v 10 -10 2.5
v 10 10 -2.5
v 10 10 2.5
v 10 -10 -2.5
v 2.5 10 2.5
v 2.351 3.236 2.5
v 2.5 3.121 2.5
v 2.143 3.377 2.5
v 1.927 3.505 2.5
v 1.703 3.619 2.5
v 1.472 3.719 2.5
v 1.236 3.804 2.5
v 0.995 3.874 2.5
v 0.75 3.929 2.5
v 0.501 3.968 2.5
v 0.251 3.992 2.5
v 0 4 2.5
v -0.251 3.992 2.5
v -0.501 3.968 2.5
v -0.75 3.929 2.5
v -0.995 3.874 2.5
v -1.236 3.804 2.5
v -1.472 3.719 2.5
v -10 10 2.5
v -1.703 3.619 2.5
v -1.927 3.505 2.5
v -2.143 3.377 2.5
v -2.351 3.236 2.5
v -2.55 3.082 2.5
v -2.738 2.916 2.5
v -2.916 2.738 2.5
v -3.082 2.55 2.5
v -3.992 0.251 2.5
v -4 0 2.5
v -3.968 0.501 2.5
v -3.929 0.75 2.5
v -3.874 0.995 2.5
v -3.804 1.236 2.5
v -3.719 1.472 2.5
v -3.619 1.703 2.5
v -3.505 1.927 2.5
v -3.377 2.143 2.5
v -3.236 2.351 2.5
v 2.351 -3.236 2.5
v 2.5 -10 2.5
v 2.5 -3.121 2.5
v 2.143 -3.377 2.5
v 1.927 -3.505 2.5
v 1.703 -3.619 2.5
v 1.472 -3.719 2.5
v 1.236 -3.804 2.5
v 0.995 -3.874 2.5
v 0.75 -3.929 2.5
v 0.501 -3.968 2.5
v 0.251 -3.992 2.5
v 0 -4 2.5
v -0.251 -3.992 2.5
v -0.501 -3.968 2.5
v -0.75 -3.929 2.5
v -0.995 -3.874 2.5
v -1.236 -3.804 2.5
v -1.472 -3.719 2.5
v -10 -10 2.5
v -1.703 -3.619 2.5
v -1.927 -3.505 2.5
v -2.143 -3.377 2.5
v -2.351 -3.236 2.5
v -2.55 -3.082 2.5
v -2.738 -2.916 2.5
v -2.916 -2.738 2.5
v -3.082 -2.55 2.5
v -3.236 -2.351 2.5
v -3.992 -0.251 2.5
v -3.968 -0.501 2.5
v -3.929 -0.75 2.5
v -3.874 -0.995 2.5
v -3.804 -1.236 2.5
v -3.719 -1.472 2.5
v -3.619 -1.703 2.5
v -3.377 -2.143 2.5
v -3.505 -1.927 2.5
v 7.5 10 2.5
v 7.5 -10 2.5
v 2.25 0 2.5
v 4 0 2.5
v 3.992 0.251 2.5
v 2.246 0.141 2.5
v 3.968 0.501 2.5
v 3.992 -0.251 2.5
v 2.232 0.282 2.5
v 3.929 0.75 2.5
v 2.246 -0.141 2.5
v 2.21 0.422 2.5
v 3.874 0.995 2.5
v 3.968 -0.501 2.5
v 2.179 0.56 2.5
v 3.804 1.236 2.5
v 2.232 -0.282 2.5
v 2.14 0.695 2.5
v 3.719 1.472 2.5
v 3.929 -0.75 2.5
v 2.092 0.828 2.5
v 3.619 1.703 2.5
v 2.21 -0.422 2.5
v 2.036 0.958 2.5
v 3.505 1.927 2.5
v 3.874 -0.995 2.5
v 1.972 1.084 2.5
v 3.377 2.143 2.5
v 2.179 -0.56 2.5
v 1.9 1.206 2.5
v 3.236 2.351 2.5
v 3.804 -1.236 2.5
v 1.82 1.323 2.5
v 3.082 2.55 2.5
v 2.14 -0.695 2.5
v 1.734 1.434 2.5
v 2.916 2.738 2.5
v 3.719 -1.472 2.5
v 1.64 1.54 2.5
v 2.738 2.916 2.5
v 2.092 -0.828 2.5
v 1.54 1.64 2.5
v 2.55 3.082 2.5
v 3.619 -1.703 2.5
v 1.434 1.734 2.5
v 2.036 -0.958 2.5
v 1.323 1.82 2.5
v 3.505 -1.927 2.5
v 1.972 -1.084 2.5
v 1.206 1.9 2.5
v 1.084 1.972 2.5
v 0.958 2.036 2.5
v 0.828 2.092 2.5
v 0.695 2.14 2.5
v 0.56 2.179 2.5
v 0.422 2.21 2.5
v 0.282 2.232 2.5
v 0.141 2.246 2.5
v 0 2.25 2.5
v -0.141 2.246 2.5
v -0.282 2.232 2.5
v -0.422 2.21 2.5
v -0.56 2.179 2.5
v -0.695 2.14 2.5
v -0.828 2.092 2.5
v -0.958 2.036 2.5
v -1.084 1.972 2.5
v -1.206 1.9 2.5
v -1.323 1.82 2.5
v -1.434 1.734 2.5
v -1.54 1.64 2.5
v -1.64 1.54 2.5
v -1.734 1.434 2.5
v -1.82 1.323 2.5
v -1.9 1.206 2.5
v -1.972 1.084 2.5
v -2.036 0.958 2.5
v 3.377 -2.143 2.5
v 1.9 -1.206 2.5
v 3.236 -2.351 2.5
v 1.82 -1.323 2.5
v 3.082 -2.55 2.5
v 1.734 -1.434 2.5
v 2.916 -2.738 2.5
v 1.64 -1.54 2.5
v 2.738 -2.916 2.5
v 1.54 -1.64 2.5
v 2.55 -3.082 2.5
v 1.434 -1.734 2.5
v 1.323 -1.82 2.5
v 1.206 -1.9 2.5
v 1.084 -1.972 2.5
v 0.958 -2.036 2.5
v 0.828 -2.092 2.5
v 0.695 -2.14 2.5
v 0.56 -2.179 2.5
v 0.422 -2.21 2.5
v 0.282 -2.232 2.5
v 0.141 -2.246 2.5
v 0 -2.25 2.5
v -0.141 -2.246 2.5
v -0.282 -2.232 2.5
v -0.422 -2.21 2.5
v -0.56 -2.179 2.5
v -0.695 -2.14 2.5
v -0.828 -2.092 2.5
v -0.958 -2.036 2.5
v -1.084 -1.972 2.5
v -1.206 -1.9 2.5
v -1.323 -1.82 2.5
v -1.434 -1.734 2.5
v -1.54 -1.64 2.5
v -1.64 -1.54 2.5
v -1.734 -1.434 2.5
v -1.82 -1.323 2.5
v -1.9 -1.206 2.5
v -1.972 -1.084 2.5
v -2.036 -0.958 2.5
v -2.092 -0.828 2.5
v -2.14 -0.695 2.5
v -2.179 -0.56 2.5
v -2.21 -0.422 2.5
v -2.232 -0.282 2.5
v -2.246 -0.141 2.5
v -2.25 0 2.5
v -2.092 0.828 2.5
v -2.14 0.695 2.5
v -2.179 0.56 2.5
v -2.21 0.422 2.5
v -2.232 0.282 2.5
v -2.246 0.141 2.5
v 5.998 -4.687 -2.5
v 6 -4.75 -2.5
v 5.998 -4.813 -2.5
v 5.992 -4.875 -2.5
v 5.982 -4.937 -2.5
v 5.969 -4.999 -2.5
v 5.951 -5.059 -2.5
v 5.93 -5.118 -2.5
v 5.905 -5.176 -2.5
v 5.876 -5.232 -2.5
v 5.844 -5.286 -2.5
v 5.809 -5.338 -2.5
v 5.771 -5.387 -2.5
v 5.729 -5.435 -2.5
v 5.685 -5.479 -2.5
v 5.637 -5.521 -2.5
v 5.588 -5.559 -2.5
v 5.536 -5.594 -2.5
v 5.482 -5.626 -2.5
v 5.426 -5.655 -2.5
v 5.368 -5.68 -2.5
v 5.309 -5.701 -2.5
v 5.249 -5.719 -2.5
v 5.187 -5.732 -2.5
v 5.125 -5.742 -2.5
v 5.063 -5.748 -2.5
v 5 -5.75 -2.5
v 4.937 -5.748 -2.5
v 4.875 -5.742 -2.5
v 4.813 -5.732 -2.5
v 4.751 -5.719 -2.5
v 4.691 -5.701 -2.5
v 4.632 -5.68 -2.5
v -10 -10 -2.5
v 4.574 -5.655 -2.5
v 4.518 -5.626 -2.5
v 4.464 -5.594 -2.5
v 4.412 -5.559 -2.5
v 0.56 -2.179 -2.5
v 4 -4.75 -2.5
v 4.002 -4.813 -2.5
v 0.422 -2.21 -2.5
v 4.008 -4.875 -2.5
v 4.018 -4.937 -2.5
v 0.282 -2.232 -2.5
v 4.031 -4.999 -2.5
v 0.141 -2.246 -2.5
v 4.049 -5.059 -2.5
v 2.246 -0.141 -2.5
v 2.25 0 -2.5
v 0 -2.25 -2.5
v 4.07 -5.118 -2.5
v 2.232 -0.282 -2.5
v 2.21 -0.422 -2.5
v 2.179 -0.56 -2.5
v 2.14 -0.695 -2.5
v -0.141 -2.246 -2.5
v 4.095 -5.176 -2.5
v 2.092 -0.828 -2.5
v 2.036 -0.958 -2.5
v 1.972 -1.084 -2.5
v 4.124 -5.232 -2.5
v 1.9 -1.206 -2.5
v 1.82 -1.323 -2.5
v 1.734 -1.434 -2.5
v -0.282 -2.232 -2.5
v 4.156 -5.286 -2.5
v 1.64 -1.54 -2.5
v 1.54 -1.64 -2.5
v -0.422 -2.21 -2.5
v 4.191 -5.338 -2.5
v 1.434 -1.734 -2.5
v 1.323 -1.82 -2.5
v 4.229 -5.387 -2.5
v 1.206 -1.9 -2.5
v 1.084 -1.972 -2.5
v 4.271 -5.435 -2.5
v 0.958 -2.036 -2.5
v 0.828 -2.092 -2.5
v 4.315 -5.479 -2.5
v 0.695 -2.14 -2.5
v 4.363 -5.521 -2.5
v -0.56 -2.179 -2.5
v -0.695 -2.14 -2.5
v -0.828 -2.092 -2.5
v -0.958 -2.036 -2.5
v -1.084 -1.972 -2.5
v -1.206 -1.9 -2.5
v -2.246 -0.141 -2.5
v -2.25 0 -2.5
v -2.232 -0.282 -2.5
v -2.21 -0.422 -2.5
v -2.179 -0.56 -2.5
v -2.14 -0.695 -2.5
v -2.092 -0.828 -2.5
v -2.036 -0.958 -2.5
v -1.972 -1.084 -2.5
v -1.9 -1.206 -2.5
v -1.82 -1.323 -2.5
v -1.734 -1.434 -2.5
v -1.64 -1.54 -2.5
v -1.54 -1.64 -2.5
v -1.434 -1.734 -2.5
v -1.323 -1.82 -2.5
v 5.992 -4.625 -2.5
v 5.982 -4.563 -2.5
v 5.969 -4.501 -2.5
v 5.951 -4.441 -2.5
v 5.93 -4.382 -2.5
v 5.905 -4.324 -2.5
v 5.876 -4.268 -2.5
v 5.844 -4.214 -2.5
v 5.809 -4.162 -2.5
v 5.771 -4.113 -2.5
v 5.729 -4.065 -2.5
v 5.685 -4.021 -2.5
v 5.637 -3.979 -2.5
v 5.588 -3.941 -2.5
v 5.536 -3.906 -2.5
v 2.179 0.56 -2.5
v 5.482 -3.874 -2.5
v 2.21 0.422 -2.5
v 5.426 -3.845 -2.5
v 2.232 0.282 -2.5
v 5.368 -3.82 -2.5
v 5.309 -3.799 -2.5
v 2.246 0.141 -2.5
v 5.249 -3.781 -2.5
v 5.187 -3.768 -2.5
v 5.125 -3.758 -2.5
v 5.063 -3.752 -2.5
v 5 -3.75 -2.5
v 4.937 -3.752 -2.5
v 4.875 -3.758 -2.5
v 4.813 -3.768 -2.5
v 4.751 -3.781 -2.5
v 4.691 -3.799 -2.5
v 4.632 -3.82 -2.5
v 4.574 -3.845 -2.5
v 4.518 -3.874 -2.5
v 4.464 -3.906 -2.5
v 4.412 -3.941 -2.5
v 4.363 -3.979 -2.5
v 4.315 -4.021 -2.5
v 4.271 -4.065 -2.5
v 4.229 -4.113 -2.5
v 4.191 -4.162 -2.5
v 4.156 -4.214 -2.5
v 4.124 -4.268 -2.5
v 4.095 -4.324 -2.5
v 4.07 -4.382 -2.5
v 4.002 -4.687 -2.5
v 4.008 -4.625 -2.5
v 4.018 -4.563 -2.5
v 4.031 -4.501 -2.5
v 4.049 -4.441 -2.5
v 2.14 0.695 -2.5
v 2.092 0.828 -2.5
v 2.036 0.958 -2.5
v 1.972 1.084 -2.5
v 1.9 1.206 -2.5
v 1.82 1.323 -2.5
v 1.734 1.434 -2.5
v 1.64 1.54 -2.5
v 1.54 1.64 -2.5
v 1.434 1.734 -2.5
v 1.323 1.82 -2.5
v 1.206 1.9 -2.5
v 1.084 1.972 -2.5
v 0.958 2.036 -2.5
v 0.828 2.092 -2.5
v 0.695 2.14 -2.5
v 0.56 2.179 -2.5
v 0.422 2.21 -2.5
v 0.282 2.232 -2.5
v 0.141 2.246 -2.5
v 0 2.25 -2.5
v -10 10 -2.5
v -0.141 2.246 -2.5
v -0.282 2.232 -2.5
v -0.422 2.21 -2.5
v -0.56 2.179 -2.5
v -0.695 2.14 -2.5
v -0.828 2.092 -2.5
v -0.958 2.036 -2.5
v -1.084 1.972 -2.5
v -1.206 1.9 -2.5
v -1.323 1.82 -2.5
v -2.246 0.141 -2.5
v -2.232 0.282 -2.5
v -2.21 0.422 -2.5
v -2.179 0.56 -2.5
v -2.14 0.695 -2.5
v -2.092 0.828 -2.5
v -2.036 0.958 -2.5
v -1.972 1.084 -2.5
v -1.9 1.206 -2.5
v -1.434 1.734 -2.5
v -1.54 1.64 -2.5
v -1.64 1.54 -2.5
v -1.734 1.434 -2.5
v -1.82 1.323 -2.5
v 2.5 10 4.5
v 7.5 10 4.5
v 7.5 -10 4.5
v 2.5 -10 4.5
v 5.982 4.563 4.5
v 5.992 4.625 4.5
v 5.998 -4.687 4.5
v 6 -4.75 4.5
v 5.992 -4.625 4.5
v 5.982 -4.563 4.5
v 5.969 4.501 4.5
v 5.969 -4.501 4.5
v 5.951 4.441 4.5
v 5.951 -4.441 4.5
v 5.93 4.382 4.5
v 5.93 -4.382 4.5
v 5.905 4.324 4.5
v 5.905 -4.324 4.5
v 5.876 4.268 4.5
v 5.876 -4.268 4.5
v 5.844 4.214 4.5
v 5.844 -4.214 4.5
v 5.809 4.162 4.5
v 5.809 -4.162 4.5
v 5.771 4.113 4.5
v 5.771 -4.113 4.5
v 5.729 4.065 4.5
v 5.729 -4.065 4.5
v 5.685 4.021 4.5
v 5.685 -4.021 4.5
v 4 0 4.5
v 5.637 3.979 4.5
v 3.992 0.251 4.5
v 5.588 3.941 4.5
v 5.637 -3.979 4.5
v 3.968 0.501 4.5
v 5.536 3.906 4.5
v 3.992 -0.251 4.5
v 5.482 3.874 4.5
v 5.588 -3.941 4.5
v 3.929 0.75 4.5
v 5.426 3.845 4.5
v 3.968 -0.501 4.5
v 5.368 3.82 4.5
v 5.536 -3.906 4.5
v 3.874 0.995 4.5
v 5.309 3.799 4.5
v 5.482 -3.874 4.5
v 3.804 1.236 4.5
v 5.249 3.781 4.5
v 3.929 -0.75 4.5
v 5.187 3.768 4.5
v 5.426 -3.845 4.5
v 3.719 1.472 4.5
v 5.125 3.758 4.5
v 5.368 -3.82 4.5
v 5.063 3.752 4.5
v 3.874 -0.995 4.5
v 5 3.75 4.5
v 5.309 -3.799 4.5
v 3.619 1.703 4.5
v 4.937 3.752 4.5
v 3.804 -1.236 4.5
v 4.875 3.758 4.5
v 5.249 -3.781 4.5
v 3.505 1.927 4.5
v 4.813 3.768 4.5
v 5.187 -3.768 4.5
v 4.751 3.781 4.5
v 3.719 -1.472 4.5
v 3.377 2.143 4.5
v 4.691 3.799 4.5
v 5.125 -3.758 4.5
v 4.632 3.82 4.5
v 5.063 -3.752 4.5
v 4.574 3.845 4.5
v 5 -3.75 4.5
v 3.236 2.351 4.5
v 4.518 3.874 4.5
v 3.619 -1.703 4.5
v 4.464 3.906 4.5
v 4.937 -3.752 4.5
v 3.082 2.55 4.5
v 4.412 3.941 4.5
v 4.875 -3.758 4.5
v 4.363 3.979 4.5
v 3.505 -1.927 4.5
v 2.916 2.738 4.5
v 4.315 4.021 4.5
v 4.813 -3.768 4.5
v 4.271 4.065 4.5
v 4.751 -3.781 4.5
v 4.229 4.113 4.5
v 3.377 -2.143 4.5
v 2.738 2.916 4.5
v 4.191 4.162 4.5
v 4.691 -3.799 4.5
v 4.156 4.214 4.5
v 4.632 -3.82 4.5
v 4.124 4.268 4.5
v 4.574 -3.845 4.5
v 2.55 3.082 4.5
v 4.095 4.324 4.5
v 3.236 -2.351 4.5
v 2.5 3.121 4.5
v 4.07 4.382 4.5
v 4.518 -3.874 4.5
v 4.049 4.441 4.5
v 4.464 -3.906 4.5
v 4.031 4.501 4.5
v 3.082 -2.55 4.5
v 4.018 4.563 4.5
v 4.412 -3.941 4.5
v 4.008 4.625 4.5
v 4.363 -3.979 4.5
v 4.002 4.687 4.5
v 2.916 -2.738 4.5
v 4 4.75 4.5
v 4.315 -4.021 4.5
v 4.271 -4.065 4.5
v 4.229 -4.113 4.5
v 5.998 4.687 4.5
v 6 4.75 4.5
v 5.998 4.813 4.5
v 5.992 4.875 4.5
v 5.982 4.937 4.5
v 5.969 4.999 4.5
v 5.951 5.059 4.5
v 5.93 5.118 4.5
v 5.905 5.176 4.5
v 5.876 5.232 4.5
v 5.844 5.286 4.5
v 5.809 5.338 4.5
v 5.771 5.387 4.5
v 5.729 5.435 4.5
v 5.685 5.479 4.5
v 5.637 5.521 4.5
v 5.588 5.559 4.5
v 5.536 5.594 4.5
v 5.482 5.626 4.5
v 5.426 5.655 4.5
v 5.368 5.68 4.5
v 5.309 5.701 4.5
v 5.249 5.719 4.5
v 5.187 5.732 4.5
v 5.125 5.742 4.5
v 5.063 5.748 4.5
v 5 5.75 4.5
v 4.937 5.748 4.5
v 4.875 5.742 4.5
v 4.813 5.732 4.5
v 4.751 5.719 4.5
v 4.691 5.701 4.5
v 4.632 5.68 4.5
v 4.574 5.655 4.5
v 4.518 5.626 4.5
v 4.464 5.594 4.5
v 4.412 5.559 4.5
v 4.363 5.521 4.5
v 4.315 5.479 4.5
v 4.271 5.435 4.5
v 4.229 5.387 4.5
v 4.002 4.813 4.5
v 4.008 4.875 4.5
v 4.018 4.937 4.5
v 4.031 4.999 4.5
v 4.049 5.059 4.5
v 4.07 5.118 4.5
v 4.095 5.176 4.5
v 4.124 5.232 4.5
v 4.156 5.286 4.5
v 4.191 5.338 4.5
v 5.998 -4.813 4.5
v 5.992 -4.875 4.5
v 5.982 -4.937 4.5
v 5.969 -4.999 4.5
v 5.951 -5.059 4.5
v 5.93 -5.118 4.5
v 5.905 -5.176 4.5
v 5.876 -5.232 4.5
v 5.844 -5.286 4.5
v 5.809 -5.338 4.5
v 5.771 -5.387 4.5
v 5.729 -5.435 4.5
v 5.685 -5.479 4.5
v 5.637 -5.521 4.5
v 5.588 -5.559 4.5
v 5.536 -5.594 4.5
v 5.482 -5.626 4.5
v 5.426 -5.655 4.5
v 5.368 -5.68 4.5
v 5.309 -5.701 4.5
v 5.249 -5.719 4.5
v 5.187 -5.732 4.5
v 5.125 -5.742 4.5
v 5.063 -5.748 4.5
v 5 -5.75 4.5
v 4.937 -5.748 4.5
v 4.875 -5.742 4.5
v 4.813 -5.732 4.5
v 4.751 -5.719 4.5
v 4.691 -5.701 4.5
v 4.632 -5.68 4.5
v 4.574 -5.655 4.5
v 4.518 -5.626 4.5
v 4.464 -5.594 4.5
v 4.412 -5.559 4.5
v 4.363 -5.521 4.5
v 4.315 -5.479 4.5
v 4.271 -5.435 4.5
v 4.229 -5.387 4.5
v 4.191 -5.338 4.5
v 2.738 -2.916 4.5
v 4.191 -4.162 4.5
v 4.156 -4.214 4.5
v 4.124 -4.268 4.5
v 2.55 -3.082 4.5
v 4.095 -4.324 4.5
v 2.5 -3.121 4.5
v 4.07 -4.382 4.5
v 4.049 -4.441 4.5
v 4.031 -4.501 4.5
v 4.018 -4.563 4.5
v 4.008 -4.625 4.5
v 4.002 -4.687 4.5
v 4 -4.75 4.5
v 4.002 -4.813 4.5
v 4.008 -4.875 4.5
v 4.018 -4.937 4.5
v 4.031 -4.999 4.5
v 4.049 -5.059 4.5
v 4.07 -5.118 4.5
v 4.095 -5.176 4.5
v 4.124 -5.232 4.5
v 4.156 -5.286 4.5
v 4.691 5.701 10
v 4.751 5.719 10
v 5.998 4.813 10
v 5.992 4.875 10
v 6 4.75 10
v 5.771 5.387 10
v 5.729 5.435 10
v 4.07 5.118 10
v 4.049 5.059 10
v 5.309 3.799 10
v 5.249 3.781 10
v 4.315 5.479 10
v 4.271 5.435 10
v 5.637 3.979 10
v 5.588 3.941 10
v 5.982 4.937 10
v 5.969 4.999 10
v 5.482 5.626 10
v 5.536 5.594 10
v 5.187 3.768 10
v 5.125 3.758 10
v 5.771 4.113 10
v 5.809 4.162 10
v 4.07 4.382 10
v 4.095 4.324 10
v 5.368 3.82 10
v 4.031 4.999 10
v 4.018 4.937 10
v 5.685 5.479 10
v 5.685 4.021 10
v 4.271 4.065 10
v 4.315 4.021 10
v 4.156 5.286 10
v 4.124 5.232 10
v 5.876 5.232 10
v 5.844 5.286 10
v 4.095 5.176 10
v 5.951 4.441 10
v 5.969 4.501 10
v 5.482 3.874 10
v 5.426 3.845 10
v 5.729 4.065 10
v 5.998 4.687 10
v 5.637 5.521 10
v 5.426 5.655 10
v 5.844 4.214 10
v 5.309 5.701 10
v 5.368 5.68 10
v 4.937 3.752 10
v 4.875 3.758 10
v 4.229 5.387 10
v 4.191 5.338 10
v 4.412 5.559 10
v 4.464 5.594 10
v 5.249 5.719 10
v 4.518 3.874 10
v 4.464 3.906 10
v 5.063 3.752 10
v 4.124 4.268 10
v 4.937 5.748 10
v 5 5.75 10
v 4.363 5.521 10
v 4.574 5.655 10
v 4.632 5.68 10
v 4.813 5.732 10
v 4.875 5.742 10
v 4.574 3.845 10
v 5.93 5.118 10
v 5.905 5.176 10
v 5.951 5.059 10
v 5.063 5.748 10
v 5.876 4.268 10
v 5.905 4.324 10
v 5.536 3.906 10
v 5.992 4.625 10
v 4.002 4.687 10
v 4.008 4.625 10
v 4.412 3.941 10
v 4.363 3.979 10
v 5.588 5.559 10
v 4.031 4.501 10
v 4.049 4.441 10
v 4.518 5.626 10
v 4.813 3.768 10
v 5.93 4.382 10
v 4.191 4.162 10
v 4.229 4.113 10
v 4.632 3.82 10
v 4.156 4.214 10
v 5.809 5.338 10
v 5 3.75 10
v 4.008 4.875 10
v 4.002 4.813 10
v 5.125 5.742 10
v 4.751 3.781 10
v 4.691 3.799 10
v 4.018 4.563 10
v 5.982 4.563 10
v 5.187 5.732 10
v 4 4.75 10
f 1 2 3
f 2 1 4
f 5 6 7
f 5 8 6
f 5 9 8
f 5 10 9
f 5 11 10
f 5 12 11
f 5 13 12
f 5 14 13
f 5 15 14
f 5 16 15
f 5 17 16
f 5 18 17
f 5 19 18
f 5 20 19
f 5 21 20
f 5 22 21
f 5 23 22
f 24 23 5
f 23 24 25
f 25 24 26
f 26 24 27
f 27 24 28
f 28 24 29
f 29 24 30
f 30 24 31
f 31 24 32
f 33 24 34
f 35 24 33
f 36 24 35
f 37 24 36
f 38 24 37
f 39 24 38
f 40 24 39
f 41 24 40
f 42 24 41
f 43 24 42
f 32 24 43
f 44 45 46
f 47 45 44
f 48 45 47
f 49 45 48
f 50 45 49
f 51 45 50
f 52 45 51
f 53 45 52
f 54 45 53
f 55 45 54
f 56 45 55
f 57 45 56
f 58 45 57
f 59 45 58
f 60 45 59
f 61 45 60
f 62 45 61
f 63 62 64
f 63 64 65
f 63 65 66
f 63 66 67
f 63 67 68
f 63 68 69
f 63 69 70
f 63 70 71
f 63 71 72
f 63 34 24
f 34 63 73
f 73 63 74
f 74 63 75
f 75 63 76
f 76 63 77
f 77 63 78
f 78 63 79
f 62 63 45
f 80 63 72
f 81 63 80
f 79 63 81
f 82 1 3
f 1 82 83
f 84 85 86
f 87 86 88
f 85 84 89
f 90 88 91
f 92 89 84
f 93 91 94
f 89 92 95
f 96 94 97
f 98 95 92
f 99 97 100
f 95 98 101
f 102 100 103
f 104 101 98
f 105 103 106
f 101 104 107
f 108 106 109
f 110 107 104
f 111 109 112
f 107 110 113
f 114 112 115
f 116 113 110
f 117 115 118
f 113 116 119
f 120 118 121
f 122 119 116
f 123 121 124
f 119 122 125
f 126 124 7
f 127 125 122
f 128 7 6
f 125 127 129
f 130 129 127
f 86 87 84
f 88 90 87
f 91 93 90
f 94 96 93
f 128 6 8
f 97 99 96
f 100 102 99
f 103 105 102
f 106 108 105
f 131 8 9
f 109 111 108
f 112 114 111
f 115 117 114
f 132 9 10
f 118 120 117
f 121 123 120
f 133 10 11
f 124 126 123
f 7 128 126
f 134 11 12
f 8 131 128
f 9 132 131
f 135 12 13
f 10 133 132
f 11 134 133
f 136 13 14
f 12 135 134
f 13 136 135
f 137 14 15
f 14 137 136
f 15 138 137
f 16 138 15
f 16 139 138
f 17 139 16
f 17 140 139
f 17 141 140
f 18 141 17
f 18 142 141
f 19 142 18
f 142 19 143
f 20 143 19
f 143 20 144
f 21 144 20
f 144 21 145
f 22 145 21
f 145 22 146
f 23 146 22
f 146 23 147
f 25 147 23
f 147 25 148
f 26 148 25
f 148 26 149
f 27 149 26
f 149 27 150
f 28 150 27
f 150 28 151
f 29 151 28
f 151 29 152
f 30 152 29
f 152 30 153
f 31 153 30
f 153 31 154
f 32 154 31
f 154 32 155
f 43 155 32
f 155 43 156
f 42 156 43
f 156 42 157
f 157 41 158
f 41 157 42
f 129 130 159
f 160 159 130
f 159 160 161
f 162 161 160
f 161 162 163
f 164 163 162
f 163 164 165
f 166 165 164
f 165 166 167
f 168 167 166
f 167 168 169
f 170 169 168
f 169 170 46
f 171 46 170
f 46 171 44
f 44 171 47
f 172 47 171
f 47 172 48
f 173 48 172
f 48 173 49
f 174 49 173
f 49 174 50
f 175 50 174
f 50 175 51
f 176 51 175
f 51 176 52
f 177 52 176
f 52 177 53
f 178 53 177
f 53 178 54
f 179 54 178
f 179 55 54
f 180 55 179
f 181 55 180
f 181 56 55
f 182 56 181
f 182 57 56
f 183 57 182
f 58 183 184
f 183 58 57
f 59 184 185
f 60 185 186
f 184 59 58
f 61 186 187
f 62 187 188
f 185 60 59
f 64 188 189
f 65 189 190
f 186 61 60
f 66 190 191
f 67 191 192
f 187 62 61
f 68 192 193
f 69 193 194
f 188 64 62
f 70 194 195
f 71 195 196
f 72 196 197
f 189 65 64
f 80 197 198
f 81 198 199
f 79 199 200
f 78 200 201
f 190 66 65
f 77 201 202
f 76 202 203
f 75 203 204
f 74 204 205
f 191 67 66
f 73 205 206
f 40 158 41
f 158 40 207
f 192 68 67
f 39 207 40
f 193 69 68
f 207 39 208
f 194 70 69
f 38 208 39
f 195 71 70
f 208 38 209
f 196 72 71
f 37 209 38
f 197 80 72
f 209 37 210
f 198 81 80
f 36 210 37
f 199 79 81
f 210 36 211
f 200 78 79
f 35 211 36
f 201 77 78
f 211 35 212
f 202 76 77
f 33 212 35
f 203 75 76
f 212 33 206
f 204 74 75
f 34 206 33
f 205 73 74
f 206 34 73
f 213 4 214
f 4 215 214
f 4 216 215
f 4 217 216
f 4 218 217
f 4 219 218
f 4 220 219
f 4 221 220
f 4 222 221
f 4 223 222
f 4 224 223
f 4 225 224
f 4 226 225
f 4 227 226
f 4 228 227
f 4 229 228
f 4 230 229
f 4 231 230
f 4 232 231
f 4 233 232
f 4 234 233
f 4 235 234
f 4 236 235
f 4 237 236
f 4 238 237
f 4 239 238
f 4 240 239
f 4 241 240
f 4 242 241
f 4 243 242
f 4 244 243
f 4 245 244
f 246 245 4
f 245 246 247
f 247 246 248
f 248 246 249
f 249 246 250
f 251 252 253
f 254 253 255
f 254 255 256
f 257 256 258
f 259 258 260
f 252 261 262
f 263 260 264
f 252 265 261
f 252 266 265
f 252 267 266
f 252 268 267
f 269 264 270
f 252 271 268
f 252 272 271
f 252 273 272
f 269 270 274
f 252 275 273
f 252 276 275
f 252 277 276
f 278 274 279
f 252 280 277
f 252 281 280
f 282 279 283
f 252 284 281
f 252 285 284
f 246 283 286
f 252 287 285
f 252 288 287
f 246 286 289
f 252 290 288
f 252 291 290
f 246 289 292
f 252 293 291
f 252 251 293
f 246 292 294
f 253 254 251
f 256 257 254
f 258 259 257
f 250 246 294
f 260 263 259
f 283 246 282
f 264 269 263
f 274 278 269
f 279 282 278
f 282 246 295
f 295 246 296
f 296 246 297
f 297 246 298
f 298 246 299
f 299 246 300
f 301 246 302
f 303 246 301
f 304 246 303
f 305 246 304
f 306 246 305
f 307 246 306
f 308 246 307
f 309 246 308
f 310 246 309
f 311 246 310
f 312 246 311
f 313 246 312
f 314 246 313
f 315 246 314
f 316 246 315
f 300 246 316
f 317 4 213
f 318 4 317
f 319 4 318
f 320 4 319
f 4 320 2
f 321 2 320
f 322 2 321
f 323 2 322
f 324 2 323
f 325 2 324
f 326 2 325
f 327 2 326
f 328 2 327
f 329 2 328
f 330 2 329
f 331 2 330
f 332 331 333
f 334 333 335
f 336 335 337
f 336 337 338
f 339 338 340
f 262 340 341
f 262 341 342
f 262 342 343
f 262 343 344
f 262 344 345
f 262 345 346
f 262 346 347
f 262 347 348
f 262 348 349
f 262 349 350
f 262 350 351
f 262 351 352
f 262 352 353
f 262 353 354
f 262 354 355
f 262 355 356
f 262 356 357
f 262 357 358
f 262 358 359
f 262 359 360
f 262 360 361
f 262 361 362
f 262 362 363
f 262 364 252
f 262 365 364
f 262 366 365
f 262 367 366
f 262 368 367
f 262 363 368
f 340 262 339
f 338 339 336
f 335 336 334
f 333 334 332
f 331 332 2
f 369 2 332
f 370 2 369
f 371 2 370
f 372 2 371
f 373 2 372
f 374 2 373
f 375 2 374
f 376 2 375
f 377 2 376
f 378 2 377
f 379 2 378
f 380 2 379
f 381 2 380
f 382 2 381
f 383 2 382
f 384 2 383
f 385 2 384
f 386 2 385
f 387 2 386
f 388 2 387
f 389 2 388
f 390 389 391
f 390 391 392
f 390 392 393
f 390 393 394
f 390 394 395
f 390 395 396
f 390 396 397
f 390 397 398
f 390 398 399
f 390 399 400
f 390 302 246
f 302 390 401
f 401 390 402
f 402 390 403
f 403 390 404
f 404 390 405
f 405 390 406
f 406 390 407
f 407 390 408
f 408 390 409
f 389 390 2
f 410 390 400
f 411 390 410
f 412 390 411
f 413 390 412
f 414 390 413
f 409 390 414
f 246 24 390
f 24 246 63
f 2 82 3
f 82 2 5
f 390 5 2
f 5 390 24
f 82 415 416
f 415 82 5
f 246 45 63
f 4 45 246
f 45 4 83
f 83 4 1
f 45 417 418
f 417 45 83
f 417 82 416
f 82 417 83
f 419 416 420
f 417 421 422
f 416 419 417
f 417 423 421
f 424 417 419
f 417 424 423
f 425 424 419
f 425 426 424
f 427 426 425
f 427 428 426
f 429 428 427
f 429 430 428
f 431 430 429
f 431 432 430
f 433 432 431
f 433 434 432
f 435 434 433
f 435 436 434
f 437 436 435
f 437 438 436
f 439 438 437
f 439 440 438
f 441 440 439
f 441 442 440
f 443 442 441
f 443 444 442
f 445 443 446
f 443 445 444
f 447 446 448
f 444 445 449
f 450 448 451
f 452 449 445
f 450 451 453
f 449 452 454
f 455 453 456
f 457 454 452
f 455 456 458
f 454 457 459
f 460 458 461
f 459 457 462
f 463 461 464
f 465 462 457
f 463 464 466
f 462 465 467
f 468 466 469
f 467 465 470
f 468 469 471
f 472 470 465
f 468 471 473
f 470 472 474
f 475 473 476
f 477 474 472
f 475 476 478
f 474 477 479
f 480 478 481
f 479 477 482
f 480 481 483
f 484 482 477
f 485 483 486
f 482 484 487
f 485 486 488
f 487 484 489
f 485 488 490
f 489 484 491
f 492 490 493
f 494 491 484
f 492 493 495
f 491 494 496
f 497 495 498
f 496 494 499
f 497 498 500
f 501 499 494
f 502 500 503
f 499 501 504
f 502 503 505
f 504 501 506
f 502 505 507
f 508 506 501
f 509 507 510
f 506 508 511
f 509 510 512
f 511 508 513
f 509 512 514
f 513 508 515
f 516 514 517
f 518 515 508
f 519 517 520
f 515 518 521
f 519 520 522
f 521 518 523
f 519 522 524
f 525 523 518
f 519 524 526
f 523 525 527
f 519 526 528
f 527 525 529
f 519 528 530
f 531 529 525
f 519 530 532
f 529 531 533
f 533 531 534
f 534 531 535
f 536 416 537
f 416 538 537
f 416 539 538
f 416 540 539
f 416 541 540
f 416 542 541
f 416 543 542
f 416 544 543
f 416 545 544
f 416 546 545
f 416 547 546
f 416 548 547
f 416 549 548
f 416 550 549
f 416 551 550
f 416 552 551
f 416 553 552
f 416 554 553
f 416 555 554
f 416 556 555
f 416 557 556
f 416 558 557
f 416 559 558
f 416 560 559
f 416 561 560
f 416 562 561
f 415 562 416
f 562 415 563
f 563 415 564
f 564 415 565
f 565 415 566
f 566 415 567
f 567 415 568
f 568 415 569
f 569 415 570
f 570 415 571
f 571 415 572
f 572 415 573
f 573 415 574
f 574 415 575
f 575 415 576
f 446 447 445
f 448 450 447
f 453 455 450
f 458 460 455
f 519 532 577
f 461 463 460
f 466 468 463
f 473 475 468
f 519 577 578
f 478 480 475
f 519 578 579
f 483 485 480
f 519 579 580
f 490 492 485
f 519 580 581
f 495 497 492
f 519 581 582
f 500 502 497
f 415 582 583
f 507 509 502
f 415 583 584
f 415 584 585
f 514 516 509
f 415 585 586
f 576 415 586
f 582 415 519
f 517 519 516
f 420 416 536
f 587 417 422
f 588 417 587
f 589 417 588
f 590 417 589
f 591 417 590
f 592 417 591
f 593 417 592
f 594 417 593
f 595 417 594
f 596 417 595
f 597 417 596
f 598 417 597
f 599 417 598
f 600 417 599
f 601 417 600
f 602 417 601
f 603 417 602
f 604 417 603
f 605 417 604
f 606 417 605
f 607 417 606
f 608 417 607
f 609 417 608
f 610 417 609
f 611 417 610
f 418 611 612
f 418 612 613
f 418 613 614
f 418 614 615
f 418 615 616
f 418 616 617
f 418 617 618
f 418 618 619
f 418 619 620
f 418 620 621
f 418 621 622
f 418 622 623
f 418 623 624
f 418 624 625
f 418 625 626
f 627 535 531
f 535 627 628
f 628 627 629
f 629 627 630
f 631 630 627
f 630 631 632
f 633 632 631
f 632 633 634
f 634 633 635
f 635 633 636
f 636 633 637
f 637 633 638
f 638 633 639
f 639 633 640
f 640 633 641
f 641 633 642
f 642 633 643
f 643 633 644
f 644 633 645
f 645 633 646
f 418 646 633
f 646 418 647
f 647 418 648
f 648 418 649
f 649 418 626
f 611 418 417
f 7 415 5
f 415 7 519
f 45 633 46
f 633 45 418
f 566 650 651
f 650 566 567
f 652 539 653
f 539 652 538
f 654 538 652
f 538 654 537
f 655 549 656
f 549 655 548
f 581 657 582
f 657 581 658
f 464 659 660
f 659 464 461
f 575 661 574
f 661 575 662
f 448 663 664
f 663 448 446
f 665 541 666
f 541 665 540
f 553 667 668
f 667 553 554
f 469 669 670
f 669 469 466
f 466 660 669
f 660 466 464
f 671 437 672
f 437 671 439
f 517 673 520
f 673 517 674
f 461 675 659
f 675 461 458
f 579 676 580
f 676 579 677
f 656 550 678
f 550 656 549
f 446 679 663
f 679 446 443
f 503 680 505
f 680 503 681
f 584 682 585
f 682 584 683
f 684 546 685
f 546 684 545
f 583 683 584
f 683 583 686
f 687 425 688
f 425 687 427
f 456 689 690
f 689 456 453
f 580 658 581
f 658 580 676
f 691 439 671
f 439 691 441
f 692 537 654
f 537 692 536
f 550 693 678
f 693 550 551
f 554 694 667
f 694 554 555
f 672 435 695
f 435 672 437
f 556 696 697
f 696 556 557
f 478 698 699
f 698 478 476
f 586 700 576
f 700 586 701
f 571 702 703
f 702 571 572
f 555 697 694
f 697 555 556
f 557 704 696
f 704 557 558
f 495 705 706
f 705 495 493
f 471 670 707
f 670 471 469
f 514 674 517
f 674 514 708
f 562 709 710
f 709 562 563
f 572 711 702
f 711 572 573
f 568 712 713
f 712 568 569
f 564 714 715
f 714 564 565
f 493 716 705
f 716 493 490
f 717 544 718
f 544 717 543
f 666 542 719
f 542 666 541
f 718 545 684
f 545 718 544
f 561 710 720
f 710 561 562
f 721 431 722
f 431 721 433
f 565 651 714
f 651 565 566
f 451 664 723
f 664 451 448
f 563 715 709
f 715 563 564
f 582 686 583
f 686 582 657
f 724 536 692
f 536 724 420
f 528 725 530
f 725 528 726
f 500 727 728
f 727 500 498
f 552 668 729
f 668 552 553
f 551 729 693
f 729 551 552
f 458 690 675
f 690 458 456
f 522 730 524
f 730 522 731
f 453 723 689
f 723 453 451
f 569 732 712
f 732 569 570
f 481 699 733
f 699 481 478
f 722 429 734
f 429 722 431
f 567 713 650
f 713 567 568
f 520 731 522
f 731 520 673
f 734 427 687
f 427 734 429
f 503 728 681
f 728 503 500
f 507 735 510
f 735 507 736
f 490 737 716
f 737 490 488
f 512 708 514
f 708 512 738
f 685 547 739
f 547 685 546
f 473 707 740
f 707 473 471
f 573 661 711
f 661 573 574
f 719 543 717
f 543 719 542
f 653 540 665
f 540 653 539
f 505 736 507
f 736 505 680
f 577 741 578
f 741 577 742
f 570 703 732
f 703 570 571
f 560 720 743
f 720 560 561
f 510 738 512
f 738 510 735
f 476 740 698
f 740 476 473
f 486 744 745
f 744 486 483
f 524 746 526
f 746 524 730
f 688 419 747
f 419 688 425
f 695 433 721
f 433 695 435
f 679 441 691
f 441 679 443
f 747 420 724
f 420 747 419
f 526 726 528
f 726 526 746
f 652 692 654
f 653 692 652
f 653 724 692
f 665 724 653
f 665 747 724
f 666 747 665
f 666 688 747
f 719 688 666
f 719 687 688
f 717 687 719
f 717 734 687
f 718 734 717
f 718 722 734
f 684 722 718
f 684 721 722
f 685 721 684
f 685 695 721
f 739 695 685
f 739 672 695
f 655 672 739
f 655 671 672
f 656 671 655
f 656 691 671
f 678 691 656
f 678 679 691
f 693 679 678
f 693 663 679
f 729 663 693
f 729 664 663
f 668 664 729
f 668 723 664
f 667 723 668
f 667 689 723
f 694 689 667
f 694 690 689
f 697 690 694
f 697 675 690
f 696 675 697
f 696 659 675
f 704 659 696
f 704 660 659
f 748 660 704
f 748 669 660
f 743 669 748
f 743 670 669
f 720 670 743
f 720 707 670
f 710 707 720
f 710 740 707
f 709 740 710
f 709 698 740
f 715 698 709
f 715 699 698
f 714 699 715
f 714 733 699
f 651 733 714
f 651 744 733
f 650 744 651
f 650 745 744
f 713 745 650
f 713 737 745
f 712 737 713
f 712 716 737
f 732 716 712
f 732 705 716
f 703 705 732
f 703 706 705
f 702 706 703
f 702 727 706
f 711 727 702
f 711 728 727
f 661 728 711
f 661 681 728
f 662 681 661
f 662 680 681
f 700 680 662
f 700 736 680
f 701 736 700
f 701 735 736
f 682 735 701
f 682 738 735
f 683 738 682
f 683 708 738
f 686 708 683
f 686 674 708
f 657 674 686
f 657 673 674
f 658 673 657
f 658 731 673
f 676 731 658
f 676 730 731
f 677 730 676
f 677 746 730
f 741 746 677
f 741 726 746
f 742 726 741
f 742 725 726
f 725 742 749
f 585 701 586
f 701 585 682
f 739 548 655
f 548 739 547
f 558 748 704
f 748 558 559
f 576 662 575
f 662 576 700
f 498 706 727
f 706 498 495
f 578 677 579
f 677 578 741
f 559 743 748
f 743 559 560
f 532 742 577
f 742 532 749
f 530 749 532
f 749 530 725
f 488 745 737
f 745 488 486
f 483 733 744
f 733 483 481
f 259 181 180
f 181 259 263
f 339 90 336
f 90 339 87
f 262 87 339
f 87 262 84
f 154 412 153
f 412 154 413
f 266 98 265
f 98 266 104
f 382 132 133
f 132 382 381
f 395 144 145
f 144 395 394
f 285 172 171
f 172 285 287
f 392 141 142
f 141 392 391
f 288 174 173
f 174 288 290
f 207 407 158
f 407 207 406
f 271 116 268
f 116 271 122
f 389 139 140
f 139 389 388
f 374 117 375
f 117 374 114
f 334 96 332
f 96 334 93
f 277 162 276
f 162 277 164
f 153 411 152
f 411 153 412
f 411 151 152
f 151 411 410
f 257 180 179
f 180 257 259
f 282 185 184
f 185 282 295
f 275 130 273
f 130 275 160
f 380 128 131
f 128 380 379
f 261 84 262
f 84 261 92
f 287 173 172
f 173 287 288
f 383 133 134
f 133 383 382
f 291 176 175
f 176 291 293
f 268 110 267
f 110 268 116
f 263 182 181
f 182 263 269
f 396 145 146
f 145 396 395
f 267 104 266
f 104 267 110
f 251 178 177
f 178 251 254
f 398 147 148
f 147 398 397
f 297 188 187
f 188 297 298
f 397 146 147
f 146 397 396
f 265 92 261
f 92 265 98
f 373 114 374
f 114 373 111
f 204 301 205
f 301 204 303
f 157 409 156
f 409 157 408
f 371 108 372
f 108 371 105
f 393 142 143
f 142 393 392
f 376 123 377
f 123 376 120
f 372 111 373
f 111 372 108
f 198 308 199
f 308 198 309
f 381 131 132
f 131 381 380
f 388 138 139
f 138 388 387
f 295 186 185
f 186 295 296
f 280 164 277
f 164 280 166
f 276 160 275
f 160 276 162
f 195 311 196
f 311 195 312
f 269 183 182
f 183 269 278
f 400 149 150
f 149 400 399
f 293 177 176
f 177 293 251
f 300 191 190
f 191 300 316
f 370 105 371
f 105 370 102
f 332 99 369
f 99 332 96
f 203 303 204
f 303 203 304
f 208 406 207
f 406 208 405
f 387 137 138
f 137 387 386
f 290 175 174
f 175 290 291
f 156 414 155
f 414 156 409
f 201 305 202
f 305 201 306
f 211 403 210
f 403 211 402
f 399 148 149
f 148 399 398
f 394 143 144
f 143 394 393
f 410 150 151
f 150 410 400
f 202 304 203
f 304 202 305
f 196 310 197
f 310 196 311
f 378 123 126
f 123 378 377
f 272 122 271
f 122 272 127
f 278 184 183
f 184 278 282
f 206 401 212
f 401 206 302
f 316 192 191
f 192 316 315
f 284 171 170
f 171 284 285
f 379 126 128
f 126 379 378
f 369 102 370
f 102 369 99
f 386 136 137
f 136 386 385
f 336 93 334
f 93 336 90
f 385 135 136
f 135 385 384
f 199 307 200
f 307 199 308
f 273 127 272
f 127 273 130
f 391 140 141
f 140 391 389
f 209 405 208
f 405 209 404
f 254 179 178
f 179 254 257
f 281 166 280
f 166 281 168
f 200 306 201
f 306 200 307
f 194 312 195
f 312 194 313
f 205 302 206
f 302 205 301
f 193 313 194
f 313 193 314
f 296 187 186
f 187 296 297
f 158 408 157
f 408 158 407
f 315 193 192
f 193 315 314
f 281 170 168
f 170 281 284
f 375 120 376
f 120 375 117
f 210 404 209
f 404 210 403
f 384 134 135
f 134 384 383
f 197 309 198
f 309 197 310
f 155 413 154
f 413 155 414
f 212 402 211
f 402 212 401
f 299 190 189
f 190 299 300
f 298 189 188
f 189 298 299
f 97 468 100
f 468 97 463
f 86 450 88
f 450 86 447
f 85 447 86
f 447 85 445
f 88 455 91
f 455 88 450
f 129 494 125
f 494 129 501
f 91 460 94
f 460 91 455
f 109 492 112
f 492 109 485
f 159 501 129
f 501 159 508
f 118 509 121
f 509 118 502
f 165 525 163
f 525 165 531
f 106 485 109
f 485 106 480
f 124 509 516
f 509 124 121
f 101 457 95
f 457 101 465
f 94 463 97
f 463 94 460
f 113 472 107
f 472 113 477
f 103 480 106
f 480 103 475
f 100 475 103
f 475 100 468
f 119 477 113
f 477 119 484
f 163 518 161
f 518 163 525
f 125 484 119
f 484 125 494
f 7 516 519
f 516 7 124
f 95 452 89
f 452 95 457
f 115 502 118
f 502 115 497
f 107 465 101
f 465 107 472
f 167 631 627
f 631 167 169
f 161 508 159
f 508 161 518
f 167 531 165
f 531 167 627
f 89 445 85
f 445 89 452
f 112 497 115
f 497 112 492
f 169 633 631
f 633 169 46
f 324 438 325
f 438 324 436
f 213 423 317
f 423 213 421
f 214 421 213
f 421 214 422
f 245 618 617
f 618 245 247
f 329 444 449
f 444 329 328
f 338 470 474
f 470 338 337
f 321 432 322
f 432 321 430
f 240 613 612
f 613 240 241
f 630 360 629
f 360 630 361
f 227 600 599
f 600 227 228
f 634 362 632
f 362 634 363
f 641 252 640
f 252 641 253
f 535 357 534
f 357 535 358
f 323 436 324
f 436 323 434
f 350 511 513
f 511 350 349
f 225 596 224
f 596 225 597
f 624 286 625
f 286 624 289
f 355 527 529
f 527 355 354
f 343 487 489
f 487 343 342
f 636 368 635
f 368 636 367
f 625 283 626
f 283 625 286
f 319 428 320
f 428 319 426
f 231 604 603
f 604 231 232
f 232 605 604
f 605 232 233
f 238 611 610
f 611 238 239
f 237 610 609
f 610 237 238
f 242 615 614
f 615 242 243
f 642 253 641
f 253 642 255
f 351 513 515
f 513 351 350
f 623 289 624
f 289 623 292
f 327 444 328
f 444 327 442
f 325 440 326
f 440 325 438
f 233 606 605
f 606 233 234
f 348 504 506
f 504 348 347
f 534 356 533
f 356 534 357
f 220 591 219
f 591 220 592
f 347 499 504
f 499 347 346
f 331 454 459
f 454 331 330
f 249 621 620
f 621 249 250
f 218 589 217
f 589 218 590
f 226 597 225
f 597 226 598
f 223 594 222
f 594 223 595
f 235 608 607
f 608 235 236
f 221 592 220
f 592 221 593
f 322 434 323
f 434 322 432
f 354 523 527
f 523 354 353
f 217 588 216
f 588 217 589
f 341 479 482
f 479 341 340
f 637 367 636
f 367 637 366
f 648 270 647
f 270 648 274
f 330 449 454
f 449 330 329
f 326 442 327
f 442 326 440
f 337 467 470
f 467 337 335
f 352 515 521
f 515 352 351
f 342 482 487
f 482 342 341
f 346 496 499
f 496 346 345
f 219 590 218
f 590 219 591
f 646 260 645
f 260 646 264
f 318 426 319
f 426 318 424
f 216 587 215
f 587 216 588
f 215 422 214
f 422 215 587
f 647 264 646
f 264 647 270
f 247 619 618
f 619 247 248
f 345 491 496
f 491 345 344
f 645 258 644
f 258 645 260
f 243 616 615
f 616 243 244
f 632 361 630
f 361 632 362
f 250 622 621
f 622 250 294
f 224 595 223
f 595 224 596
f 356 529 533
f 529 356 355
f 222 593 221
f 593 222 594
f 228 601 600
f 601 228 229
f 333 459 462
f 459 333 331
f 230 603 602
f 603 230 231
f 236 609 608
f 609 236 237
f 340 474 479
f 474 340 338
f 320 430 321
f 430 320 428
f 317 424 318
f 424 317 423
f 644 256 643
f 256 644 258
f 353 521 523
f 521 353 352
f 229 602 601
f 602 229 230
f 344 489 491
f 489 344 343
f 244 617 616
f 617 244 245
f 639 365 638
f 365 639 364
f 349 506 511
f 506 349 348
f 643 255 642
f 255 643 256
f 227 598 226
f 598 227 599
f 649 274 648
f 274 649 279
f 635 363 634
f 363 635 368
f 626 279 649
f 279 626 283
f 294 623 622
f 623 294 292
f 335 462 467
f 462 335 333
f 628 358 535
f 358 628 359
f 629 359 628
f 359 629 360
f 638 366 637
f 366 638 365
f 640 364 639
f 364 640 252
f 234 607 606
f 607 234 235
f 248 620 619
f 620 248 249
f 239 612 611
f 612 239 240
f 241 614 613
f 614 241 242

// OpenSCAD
// file: microswitch.scad
//
// Mendel90
//
// GNU GPL v2
// nop.head@gmail.com
// hydraraptor.blogspot.com
//
// Microswitch used for endstops
//
// Found at:
// https://github.com/christianege/openscad/blob/master/vitamins/microswitch.scad


function microswitch_thickness() = 6.4;
function microswitch_length() = 19.8;

function microswitch_first_hole_x_offset() = -2;

function microswitch_button_x_offset() = -(5.1 - microswitch_first_hole_x_offset()) + microswitch_length() / 2;
function microswitch_hole_y_offset() = -8.4;

module microswitch_hole_positions()
{
    for(x = [microswitch_first_hole_x_offset(), 7.5])
         translate([x, microswitch_hole_y_offset(), microswitch_thickness() / 2])
              child();
}

module microswitch_holes(r = No2_pilot_radius, h = 7.5)
{
    translate([0, 0, -microswitch_thickness() - h / 2])
        microswitch_hole_positions()
            teardrop_plus(r = r, h = h + 1, $fn=100, center = true);
}

module microswitch_contact_space() {
    depth = 15;
    translate([-microswitch_first_hole_x_offset() + 0.75,  -depth / 2 - 3, 0])
        cube([microswitch_length() - 2, depth, microswitch_thickness() - 2], center = true);
}

module microswitch() {
    vitamin("SMMICRO: Microswitch");
    translate([-(5.1 + 9.5 - 7.5), -(8.4 + 2.5), -3.2 + (exploded ? 5 : 0)]) {   // put operating point of button at the origin
        color(microswitch_color) render() difference() {              // main body
            cube([19.8, 10.2, 6.4]);
            translate([10, 9.5, -1])
                cube([19.8, 10.2, 8]);                      // lower half of top
            translate([5.1, 2.5, -1])
                cylinder(r = 2.35 / 2, h = 8);              // mounting holes
            translate([5.1 + 9.5, 2.5, -1])
                cylinder(r = 2.35 / 2, h = 8);
        }
        color(microswitch_button_color) render()                           // orange button
            translate([5.1 + 9.5 - 7.5,8.4 + 2.5 - 0.5,1.6])
                linear_extrude(height = 3.2)
                    hull() {
                        circle(r = 1);
                        translate([0,-4])
                            circle(r = 1);
                    }
        color(microswitch_contact_color)  render()                            // yellow contacts
            for(x = [1.6, 1.6 + 8.8, 1.6 + 8.8 + 7.3])
                translate([x, 2.5 - 6.4, 1.6])
                    difference() {
                        cube([0.5, 7, 3.2]);
                        translate([0, 1.6, 1.6])
                            rotate([0,90,0])
                                cylinder(r = 0.8, h = 5, center = true);
                    }
    }
}
// file: vars.scad
/* Makefile needs */
PART = "none";
IMAGE = "none";

/* colors */
part_color = "skyblue";

/* frame */
height = 690;
width = 500;
depth = 500;

frame_size = 20;
frame_half = frame_size / 2;

glass_height = 3;
glass_width = 400;
glass_depth = 400;

rail_diam = 10;
z_rail_width = 60;
z_carriage_width = z_rail_width + frame_size;

// Sources for Metric fastener dimensions
// http://www.carbidedepot.com/formulas-tap-metric.htm
// http://www.roymech.co.uk/Useful_Tables/Screws/cap_screws.htm
// https://www.fairburyfastener.com/xdims_metric_nuts.htm

// M5
M5_bolt_diam = 5;
M5_bolt_hole = 5.5;
M5_bolt_head_diam = 9;
M5_bolt_head_height = 4;
M5_nut_height = 4;
M5_nut_width = 7.9;
M5_nut_diam = 9;

// M4
M4_bolt_diam = 4;
M4_bolt_hole = 4.5;
M4_bolt_head_diam = 8;
M4_bolt_head_height = 3;
M4_nut_height = 3.5;
M4_nut_width = 6.9;
M4_nut_diam = 8;


//608zz
608zz_height=7;
608zz_od=22;
608zz_id=8;
608zz_race=11;



// Height adjustment
pivot_diam=12;
height_bolt_diam=M4_bolt_diam;
// main file
/*
 *
 * Copyright 2019 Tim Schaller
 * All rights reserved
 * Released under the GPL3
 * No claims are made as to the fitness and/or corectness of
 * this work. Use at your own risk. If you create useless things,
 * or if the parts fail it is on you NOT ME. As far as I know
 * this might make your printer burst into flames or print
 * little pink bunnies. You call. };->
 *
*/

include <vars.scad>;
use <microswitch.scad>;

PART = "rail_end_stop_2";


if (PART == "rail_end_stop_assembly") {
  color(part_color) rail_end_stop_top();
  color(part_color, 0.75) rail_end_stop_bottom();

  color("black",0.25) translate([-3, 8.5, 11]) microswitch();
}

if (PART == "rail_end_stop_top") {
  color(part_color) rail_end_stop_top();
}

if (PART == "rail_end_stop_bottom") {
  color(part_color) rail_end_stop_bottom();
}

if (PART == "rail_end_stop_2") {
  color(part_color) rail_end_stop_2();
}


/* ========================================================= */
/* MODULES                                                   */
/* ========================================================= */

module rail_end_stop_top(id=10, od=14, width=5){
  difference(){
    color(part_color) rail_end_stop(id, od, width);
    translate([0, 0,-20]) cube([30,30,40],center=true);
  }
}

module rail_end_stop_bottom(id=10, od=14, width=5){
  difference(){
    color(part_color) rail_end_stop(id, od, width);
    translate([0, 0, 20]) cube([30,30,40],center=true);
  }
}

module rail_end_stop(id=10, od=14, width=5){
  plate_height=2;
  plate_width=20;
  plate_depth=width;

  union(){
    rotate([90, 0, 0]) difference(){
      union(){
        cylinder(h=width, d=od, $fn=100, center=true);
        cube([od+10, 4, width], center=true);
      }
      cylinder(h=width+1, d=id, $fn=100, center=true); // rail
      rotate([90,0,0]){
        translate([ (od/2+2), 0, 0]) cylinder(h=5, d=3.5, $fn=100, center=true);
        translate([-(od/2+2), 0, 0]) cylinder(h=5, d=3.5, $fn=100, center=true);
      }
    }
    difference(){
      translate([0, 0, (od+plate_height)/2-1]) cube([plate_width, plate_depth, plate_height], center=true);
      translate([-4.75, 0, (od+plate_height)/2-1]) cylinder(h=6, $fn=100, center=true);
    }
    translate([ 4.75, 0, (od+plate_height)/2+2]) cylinder(h=6, $fn=100, center=true);
  }
}

module rail_end_stop_2(){
  difference(){
    union(){
      cube([20,20,5], center=true);
      translate([5, 0, 3.5]) cube([5, 20, 2], center=true);
      translate([5, 4.75, 2.5 + (M4_bolt_head_height/2) + 3]) cylinder(h=6, d=2, $fn=100, center=true);
    }
    cylinder(h=6, d=M4_bolt_hole, $fn=100, center=true);
    translate([0,0,2.5+(M4_bolt_head_height/2)]) cylinder(h=M4_bolt_head_height, d=M4_bolt_head_diam, $fn=100, center=true);
    translate([5,-4.75, 2]) cylinder(h=10, d=2, $fn=100, center=true);
  }
}
